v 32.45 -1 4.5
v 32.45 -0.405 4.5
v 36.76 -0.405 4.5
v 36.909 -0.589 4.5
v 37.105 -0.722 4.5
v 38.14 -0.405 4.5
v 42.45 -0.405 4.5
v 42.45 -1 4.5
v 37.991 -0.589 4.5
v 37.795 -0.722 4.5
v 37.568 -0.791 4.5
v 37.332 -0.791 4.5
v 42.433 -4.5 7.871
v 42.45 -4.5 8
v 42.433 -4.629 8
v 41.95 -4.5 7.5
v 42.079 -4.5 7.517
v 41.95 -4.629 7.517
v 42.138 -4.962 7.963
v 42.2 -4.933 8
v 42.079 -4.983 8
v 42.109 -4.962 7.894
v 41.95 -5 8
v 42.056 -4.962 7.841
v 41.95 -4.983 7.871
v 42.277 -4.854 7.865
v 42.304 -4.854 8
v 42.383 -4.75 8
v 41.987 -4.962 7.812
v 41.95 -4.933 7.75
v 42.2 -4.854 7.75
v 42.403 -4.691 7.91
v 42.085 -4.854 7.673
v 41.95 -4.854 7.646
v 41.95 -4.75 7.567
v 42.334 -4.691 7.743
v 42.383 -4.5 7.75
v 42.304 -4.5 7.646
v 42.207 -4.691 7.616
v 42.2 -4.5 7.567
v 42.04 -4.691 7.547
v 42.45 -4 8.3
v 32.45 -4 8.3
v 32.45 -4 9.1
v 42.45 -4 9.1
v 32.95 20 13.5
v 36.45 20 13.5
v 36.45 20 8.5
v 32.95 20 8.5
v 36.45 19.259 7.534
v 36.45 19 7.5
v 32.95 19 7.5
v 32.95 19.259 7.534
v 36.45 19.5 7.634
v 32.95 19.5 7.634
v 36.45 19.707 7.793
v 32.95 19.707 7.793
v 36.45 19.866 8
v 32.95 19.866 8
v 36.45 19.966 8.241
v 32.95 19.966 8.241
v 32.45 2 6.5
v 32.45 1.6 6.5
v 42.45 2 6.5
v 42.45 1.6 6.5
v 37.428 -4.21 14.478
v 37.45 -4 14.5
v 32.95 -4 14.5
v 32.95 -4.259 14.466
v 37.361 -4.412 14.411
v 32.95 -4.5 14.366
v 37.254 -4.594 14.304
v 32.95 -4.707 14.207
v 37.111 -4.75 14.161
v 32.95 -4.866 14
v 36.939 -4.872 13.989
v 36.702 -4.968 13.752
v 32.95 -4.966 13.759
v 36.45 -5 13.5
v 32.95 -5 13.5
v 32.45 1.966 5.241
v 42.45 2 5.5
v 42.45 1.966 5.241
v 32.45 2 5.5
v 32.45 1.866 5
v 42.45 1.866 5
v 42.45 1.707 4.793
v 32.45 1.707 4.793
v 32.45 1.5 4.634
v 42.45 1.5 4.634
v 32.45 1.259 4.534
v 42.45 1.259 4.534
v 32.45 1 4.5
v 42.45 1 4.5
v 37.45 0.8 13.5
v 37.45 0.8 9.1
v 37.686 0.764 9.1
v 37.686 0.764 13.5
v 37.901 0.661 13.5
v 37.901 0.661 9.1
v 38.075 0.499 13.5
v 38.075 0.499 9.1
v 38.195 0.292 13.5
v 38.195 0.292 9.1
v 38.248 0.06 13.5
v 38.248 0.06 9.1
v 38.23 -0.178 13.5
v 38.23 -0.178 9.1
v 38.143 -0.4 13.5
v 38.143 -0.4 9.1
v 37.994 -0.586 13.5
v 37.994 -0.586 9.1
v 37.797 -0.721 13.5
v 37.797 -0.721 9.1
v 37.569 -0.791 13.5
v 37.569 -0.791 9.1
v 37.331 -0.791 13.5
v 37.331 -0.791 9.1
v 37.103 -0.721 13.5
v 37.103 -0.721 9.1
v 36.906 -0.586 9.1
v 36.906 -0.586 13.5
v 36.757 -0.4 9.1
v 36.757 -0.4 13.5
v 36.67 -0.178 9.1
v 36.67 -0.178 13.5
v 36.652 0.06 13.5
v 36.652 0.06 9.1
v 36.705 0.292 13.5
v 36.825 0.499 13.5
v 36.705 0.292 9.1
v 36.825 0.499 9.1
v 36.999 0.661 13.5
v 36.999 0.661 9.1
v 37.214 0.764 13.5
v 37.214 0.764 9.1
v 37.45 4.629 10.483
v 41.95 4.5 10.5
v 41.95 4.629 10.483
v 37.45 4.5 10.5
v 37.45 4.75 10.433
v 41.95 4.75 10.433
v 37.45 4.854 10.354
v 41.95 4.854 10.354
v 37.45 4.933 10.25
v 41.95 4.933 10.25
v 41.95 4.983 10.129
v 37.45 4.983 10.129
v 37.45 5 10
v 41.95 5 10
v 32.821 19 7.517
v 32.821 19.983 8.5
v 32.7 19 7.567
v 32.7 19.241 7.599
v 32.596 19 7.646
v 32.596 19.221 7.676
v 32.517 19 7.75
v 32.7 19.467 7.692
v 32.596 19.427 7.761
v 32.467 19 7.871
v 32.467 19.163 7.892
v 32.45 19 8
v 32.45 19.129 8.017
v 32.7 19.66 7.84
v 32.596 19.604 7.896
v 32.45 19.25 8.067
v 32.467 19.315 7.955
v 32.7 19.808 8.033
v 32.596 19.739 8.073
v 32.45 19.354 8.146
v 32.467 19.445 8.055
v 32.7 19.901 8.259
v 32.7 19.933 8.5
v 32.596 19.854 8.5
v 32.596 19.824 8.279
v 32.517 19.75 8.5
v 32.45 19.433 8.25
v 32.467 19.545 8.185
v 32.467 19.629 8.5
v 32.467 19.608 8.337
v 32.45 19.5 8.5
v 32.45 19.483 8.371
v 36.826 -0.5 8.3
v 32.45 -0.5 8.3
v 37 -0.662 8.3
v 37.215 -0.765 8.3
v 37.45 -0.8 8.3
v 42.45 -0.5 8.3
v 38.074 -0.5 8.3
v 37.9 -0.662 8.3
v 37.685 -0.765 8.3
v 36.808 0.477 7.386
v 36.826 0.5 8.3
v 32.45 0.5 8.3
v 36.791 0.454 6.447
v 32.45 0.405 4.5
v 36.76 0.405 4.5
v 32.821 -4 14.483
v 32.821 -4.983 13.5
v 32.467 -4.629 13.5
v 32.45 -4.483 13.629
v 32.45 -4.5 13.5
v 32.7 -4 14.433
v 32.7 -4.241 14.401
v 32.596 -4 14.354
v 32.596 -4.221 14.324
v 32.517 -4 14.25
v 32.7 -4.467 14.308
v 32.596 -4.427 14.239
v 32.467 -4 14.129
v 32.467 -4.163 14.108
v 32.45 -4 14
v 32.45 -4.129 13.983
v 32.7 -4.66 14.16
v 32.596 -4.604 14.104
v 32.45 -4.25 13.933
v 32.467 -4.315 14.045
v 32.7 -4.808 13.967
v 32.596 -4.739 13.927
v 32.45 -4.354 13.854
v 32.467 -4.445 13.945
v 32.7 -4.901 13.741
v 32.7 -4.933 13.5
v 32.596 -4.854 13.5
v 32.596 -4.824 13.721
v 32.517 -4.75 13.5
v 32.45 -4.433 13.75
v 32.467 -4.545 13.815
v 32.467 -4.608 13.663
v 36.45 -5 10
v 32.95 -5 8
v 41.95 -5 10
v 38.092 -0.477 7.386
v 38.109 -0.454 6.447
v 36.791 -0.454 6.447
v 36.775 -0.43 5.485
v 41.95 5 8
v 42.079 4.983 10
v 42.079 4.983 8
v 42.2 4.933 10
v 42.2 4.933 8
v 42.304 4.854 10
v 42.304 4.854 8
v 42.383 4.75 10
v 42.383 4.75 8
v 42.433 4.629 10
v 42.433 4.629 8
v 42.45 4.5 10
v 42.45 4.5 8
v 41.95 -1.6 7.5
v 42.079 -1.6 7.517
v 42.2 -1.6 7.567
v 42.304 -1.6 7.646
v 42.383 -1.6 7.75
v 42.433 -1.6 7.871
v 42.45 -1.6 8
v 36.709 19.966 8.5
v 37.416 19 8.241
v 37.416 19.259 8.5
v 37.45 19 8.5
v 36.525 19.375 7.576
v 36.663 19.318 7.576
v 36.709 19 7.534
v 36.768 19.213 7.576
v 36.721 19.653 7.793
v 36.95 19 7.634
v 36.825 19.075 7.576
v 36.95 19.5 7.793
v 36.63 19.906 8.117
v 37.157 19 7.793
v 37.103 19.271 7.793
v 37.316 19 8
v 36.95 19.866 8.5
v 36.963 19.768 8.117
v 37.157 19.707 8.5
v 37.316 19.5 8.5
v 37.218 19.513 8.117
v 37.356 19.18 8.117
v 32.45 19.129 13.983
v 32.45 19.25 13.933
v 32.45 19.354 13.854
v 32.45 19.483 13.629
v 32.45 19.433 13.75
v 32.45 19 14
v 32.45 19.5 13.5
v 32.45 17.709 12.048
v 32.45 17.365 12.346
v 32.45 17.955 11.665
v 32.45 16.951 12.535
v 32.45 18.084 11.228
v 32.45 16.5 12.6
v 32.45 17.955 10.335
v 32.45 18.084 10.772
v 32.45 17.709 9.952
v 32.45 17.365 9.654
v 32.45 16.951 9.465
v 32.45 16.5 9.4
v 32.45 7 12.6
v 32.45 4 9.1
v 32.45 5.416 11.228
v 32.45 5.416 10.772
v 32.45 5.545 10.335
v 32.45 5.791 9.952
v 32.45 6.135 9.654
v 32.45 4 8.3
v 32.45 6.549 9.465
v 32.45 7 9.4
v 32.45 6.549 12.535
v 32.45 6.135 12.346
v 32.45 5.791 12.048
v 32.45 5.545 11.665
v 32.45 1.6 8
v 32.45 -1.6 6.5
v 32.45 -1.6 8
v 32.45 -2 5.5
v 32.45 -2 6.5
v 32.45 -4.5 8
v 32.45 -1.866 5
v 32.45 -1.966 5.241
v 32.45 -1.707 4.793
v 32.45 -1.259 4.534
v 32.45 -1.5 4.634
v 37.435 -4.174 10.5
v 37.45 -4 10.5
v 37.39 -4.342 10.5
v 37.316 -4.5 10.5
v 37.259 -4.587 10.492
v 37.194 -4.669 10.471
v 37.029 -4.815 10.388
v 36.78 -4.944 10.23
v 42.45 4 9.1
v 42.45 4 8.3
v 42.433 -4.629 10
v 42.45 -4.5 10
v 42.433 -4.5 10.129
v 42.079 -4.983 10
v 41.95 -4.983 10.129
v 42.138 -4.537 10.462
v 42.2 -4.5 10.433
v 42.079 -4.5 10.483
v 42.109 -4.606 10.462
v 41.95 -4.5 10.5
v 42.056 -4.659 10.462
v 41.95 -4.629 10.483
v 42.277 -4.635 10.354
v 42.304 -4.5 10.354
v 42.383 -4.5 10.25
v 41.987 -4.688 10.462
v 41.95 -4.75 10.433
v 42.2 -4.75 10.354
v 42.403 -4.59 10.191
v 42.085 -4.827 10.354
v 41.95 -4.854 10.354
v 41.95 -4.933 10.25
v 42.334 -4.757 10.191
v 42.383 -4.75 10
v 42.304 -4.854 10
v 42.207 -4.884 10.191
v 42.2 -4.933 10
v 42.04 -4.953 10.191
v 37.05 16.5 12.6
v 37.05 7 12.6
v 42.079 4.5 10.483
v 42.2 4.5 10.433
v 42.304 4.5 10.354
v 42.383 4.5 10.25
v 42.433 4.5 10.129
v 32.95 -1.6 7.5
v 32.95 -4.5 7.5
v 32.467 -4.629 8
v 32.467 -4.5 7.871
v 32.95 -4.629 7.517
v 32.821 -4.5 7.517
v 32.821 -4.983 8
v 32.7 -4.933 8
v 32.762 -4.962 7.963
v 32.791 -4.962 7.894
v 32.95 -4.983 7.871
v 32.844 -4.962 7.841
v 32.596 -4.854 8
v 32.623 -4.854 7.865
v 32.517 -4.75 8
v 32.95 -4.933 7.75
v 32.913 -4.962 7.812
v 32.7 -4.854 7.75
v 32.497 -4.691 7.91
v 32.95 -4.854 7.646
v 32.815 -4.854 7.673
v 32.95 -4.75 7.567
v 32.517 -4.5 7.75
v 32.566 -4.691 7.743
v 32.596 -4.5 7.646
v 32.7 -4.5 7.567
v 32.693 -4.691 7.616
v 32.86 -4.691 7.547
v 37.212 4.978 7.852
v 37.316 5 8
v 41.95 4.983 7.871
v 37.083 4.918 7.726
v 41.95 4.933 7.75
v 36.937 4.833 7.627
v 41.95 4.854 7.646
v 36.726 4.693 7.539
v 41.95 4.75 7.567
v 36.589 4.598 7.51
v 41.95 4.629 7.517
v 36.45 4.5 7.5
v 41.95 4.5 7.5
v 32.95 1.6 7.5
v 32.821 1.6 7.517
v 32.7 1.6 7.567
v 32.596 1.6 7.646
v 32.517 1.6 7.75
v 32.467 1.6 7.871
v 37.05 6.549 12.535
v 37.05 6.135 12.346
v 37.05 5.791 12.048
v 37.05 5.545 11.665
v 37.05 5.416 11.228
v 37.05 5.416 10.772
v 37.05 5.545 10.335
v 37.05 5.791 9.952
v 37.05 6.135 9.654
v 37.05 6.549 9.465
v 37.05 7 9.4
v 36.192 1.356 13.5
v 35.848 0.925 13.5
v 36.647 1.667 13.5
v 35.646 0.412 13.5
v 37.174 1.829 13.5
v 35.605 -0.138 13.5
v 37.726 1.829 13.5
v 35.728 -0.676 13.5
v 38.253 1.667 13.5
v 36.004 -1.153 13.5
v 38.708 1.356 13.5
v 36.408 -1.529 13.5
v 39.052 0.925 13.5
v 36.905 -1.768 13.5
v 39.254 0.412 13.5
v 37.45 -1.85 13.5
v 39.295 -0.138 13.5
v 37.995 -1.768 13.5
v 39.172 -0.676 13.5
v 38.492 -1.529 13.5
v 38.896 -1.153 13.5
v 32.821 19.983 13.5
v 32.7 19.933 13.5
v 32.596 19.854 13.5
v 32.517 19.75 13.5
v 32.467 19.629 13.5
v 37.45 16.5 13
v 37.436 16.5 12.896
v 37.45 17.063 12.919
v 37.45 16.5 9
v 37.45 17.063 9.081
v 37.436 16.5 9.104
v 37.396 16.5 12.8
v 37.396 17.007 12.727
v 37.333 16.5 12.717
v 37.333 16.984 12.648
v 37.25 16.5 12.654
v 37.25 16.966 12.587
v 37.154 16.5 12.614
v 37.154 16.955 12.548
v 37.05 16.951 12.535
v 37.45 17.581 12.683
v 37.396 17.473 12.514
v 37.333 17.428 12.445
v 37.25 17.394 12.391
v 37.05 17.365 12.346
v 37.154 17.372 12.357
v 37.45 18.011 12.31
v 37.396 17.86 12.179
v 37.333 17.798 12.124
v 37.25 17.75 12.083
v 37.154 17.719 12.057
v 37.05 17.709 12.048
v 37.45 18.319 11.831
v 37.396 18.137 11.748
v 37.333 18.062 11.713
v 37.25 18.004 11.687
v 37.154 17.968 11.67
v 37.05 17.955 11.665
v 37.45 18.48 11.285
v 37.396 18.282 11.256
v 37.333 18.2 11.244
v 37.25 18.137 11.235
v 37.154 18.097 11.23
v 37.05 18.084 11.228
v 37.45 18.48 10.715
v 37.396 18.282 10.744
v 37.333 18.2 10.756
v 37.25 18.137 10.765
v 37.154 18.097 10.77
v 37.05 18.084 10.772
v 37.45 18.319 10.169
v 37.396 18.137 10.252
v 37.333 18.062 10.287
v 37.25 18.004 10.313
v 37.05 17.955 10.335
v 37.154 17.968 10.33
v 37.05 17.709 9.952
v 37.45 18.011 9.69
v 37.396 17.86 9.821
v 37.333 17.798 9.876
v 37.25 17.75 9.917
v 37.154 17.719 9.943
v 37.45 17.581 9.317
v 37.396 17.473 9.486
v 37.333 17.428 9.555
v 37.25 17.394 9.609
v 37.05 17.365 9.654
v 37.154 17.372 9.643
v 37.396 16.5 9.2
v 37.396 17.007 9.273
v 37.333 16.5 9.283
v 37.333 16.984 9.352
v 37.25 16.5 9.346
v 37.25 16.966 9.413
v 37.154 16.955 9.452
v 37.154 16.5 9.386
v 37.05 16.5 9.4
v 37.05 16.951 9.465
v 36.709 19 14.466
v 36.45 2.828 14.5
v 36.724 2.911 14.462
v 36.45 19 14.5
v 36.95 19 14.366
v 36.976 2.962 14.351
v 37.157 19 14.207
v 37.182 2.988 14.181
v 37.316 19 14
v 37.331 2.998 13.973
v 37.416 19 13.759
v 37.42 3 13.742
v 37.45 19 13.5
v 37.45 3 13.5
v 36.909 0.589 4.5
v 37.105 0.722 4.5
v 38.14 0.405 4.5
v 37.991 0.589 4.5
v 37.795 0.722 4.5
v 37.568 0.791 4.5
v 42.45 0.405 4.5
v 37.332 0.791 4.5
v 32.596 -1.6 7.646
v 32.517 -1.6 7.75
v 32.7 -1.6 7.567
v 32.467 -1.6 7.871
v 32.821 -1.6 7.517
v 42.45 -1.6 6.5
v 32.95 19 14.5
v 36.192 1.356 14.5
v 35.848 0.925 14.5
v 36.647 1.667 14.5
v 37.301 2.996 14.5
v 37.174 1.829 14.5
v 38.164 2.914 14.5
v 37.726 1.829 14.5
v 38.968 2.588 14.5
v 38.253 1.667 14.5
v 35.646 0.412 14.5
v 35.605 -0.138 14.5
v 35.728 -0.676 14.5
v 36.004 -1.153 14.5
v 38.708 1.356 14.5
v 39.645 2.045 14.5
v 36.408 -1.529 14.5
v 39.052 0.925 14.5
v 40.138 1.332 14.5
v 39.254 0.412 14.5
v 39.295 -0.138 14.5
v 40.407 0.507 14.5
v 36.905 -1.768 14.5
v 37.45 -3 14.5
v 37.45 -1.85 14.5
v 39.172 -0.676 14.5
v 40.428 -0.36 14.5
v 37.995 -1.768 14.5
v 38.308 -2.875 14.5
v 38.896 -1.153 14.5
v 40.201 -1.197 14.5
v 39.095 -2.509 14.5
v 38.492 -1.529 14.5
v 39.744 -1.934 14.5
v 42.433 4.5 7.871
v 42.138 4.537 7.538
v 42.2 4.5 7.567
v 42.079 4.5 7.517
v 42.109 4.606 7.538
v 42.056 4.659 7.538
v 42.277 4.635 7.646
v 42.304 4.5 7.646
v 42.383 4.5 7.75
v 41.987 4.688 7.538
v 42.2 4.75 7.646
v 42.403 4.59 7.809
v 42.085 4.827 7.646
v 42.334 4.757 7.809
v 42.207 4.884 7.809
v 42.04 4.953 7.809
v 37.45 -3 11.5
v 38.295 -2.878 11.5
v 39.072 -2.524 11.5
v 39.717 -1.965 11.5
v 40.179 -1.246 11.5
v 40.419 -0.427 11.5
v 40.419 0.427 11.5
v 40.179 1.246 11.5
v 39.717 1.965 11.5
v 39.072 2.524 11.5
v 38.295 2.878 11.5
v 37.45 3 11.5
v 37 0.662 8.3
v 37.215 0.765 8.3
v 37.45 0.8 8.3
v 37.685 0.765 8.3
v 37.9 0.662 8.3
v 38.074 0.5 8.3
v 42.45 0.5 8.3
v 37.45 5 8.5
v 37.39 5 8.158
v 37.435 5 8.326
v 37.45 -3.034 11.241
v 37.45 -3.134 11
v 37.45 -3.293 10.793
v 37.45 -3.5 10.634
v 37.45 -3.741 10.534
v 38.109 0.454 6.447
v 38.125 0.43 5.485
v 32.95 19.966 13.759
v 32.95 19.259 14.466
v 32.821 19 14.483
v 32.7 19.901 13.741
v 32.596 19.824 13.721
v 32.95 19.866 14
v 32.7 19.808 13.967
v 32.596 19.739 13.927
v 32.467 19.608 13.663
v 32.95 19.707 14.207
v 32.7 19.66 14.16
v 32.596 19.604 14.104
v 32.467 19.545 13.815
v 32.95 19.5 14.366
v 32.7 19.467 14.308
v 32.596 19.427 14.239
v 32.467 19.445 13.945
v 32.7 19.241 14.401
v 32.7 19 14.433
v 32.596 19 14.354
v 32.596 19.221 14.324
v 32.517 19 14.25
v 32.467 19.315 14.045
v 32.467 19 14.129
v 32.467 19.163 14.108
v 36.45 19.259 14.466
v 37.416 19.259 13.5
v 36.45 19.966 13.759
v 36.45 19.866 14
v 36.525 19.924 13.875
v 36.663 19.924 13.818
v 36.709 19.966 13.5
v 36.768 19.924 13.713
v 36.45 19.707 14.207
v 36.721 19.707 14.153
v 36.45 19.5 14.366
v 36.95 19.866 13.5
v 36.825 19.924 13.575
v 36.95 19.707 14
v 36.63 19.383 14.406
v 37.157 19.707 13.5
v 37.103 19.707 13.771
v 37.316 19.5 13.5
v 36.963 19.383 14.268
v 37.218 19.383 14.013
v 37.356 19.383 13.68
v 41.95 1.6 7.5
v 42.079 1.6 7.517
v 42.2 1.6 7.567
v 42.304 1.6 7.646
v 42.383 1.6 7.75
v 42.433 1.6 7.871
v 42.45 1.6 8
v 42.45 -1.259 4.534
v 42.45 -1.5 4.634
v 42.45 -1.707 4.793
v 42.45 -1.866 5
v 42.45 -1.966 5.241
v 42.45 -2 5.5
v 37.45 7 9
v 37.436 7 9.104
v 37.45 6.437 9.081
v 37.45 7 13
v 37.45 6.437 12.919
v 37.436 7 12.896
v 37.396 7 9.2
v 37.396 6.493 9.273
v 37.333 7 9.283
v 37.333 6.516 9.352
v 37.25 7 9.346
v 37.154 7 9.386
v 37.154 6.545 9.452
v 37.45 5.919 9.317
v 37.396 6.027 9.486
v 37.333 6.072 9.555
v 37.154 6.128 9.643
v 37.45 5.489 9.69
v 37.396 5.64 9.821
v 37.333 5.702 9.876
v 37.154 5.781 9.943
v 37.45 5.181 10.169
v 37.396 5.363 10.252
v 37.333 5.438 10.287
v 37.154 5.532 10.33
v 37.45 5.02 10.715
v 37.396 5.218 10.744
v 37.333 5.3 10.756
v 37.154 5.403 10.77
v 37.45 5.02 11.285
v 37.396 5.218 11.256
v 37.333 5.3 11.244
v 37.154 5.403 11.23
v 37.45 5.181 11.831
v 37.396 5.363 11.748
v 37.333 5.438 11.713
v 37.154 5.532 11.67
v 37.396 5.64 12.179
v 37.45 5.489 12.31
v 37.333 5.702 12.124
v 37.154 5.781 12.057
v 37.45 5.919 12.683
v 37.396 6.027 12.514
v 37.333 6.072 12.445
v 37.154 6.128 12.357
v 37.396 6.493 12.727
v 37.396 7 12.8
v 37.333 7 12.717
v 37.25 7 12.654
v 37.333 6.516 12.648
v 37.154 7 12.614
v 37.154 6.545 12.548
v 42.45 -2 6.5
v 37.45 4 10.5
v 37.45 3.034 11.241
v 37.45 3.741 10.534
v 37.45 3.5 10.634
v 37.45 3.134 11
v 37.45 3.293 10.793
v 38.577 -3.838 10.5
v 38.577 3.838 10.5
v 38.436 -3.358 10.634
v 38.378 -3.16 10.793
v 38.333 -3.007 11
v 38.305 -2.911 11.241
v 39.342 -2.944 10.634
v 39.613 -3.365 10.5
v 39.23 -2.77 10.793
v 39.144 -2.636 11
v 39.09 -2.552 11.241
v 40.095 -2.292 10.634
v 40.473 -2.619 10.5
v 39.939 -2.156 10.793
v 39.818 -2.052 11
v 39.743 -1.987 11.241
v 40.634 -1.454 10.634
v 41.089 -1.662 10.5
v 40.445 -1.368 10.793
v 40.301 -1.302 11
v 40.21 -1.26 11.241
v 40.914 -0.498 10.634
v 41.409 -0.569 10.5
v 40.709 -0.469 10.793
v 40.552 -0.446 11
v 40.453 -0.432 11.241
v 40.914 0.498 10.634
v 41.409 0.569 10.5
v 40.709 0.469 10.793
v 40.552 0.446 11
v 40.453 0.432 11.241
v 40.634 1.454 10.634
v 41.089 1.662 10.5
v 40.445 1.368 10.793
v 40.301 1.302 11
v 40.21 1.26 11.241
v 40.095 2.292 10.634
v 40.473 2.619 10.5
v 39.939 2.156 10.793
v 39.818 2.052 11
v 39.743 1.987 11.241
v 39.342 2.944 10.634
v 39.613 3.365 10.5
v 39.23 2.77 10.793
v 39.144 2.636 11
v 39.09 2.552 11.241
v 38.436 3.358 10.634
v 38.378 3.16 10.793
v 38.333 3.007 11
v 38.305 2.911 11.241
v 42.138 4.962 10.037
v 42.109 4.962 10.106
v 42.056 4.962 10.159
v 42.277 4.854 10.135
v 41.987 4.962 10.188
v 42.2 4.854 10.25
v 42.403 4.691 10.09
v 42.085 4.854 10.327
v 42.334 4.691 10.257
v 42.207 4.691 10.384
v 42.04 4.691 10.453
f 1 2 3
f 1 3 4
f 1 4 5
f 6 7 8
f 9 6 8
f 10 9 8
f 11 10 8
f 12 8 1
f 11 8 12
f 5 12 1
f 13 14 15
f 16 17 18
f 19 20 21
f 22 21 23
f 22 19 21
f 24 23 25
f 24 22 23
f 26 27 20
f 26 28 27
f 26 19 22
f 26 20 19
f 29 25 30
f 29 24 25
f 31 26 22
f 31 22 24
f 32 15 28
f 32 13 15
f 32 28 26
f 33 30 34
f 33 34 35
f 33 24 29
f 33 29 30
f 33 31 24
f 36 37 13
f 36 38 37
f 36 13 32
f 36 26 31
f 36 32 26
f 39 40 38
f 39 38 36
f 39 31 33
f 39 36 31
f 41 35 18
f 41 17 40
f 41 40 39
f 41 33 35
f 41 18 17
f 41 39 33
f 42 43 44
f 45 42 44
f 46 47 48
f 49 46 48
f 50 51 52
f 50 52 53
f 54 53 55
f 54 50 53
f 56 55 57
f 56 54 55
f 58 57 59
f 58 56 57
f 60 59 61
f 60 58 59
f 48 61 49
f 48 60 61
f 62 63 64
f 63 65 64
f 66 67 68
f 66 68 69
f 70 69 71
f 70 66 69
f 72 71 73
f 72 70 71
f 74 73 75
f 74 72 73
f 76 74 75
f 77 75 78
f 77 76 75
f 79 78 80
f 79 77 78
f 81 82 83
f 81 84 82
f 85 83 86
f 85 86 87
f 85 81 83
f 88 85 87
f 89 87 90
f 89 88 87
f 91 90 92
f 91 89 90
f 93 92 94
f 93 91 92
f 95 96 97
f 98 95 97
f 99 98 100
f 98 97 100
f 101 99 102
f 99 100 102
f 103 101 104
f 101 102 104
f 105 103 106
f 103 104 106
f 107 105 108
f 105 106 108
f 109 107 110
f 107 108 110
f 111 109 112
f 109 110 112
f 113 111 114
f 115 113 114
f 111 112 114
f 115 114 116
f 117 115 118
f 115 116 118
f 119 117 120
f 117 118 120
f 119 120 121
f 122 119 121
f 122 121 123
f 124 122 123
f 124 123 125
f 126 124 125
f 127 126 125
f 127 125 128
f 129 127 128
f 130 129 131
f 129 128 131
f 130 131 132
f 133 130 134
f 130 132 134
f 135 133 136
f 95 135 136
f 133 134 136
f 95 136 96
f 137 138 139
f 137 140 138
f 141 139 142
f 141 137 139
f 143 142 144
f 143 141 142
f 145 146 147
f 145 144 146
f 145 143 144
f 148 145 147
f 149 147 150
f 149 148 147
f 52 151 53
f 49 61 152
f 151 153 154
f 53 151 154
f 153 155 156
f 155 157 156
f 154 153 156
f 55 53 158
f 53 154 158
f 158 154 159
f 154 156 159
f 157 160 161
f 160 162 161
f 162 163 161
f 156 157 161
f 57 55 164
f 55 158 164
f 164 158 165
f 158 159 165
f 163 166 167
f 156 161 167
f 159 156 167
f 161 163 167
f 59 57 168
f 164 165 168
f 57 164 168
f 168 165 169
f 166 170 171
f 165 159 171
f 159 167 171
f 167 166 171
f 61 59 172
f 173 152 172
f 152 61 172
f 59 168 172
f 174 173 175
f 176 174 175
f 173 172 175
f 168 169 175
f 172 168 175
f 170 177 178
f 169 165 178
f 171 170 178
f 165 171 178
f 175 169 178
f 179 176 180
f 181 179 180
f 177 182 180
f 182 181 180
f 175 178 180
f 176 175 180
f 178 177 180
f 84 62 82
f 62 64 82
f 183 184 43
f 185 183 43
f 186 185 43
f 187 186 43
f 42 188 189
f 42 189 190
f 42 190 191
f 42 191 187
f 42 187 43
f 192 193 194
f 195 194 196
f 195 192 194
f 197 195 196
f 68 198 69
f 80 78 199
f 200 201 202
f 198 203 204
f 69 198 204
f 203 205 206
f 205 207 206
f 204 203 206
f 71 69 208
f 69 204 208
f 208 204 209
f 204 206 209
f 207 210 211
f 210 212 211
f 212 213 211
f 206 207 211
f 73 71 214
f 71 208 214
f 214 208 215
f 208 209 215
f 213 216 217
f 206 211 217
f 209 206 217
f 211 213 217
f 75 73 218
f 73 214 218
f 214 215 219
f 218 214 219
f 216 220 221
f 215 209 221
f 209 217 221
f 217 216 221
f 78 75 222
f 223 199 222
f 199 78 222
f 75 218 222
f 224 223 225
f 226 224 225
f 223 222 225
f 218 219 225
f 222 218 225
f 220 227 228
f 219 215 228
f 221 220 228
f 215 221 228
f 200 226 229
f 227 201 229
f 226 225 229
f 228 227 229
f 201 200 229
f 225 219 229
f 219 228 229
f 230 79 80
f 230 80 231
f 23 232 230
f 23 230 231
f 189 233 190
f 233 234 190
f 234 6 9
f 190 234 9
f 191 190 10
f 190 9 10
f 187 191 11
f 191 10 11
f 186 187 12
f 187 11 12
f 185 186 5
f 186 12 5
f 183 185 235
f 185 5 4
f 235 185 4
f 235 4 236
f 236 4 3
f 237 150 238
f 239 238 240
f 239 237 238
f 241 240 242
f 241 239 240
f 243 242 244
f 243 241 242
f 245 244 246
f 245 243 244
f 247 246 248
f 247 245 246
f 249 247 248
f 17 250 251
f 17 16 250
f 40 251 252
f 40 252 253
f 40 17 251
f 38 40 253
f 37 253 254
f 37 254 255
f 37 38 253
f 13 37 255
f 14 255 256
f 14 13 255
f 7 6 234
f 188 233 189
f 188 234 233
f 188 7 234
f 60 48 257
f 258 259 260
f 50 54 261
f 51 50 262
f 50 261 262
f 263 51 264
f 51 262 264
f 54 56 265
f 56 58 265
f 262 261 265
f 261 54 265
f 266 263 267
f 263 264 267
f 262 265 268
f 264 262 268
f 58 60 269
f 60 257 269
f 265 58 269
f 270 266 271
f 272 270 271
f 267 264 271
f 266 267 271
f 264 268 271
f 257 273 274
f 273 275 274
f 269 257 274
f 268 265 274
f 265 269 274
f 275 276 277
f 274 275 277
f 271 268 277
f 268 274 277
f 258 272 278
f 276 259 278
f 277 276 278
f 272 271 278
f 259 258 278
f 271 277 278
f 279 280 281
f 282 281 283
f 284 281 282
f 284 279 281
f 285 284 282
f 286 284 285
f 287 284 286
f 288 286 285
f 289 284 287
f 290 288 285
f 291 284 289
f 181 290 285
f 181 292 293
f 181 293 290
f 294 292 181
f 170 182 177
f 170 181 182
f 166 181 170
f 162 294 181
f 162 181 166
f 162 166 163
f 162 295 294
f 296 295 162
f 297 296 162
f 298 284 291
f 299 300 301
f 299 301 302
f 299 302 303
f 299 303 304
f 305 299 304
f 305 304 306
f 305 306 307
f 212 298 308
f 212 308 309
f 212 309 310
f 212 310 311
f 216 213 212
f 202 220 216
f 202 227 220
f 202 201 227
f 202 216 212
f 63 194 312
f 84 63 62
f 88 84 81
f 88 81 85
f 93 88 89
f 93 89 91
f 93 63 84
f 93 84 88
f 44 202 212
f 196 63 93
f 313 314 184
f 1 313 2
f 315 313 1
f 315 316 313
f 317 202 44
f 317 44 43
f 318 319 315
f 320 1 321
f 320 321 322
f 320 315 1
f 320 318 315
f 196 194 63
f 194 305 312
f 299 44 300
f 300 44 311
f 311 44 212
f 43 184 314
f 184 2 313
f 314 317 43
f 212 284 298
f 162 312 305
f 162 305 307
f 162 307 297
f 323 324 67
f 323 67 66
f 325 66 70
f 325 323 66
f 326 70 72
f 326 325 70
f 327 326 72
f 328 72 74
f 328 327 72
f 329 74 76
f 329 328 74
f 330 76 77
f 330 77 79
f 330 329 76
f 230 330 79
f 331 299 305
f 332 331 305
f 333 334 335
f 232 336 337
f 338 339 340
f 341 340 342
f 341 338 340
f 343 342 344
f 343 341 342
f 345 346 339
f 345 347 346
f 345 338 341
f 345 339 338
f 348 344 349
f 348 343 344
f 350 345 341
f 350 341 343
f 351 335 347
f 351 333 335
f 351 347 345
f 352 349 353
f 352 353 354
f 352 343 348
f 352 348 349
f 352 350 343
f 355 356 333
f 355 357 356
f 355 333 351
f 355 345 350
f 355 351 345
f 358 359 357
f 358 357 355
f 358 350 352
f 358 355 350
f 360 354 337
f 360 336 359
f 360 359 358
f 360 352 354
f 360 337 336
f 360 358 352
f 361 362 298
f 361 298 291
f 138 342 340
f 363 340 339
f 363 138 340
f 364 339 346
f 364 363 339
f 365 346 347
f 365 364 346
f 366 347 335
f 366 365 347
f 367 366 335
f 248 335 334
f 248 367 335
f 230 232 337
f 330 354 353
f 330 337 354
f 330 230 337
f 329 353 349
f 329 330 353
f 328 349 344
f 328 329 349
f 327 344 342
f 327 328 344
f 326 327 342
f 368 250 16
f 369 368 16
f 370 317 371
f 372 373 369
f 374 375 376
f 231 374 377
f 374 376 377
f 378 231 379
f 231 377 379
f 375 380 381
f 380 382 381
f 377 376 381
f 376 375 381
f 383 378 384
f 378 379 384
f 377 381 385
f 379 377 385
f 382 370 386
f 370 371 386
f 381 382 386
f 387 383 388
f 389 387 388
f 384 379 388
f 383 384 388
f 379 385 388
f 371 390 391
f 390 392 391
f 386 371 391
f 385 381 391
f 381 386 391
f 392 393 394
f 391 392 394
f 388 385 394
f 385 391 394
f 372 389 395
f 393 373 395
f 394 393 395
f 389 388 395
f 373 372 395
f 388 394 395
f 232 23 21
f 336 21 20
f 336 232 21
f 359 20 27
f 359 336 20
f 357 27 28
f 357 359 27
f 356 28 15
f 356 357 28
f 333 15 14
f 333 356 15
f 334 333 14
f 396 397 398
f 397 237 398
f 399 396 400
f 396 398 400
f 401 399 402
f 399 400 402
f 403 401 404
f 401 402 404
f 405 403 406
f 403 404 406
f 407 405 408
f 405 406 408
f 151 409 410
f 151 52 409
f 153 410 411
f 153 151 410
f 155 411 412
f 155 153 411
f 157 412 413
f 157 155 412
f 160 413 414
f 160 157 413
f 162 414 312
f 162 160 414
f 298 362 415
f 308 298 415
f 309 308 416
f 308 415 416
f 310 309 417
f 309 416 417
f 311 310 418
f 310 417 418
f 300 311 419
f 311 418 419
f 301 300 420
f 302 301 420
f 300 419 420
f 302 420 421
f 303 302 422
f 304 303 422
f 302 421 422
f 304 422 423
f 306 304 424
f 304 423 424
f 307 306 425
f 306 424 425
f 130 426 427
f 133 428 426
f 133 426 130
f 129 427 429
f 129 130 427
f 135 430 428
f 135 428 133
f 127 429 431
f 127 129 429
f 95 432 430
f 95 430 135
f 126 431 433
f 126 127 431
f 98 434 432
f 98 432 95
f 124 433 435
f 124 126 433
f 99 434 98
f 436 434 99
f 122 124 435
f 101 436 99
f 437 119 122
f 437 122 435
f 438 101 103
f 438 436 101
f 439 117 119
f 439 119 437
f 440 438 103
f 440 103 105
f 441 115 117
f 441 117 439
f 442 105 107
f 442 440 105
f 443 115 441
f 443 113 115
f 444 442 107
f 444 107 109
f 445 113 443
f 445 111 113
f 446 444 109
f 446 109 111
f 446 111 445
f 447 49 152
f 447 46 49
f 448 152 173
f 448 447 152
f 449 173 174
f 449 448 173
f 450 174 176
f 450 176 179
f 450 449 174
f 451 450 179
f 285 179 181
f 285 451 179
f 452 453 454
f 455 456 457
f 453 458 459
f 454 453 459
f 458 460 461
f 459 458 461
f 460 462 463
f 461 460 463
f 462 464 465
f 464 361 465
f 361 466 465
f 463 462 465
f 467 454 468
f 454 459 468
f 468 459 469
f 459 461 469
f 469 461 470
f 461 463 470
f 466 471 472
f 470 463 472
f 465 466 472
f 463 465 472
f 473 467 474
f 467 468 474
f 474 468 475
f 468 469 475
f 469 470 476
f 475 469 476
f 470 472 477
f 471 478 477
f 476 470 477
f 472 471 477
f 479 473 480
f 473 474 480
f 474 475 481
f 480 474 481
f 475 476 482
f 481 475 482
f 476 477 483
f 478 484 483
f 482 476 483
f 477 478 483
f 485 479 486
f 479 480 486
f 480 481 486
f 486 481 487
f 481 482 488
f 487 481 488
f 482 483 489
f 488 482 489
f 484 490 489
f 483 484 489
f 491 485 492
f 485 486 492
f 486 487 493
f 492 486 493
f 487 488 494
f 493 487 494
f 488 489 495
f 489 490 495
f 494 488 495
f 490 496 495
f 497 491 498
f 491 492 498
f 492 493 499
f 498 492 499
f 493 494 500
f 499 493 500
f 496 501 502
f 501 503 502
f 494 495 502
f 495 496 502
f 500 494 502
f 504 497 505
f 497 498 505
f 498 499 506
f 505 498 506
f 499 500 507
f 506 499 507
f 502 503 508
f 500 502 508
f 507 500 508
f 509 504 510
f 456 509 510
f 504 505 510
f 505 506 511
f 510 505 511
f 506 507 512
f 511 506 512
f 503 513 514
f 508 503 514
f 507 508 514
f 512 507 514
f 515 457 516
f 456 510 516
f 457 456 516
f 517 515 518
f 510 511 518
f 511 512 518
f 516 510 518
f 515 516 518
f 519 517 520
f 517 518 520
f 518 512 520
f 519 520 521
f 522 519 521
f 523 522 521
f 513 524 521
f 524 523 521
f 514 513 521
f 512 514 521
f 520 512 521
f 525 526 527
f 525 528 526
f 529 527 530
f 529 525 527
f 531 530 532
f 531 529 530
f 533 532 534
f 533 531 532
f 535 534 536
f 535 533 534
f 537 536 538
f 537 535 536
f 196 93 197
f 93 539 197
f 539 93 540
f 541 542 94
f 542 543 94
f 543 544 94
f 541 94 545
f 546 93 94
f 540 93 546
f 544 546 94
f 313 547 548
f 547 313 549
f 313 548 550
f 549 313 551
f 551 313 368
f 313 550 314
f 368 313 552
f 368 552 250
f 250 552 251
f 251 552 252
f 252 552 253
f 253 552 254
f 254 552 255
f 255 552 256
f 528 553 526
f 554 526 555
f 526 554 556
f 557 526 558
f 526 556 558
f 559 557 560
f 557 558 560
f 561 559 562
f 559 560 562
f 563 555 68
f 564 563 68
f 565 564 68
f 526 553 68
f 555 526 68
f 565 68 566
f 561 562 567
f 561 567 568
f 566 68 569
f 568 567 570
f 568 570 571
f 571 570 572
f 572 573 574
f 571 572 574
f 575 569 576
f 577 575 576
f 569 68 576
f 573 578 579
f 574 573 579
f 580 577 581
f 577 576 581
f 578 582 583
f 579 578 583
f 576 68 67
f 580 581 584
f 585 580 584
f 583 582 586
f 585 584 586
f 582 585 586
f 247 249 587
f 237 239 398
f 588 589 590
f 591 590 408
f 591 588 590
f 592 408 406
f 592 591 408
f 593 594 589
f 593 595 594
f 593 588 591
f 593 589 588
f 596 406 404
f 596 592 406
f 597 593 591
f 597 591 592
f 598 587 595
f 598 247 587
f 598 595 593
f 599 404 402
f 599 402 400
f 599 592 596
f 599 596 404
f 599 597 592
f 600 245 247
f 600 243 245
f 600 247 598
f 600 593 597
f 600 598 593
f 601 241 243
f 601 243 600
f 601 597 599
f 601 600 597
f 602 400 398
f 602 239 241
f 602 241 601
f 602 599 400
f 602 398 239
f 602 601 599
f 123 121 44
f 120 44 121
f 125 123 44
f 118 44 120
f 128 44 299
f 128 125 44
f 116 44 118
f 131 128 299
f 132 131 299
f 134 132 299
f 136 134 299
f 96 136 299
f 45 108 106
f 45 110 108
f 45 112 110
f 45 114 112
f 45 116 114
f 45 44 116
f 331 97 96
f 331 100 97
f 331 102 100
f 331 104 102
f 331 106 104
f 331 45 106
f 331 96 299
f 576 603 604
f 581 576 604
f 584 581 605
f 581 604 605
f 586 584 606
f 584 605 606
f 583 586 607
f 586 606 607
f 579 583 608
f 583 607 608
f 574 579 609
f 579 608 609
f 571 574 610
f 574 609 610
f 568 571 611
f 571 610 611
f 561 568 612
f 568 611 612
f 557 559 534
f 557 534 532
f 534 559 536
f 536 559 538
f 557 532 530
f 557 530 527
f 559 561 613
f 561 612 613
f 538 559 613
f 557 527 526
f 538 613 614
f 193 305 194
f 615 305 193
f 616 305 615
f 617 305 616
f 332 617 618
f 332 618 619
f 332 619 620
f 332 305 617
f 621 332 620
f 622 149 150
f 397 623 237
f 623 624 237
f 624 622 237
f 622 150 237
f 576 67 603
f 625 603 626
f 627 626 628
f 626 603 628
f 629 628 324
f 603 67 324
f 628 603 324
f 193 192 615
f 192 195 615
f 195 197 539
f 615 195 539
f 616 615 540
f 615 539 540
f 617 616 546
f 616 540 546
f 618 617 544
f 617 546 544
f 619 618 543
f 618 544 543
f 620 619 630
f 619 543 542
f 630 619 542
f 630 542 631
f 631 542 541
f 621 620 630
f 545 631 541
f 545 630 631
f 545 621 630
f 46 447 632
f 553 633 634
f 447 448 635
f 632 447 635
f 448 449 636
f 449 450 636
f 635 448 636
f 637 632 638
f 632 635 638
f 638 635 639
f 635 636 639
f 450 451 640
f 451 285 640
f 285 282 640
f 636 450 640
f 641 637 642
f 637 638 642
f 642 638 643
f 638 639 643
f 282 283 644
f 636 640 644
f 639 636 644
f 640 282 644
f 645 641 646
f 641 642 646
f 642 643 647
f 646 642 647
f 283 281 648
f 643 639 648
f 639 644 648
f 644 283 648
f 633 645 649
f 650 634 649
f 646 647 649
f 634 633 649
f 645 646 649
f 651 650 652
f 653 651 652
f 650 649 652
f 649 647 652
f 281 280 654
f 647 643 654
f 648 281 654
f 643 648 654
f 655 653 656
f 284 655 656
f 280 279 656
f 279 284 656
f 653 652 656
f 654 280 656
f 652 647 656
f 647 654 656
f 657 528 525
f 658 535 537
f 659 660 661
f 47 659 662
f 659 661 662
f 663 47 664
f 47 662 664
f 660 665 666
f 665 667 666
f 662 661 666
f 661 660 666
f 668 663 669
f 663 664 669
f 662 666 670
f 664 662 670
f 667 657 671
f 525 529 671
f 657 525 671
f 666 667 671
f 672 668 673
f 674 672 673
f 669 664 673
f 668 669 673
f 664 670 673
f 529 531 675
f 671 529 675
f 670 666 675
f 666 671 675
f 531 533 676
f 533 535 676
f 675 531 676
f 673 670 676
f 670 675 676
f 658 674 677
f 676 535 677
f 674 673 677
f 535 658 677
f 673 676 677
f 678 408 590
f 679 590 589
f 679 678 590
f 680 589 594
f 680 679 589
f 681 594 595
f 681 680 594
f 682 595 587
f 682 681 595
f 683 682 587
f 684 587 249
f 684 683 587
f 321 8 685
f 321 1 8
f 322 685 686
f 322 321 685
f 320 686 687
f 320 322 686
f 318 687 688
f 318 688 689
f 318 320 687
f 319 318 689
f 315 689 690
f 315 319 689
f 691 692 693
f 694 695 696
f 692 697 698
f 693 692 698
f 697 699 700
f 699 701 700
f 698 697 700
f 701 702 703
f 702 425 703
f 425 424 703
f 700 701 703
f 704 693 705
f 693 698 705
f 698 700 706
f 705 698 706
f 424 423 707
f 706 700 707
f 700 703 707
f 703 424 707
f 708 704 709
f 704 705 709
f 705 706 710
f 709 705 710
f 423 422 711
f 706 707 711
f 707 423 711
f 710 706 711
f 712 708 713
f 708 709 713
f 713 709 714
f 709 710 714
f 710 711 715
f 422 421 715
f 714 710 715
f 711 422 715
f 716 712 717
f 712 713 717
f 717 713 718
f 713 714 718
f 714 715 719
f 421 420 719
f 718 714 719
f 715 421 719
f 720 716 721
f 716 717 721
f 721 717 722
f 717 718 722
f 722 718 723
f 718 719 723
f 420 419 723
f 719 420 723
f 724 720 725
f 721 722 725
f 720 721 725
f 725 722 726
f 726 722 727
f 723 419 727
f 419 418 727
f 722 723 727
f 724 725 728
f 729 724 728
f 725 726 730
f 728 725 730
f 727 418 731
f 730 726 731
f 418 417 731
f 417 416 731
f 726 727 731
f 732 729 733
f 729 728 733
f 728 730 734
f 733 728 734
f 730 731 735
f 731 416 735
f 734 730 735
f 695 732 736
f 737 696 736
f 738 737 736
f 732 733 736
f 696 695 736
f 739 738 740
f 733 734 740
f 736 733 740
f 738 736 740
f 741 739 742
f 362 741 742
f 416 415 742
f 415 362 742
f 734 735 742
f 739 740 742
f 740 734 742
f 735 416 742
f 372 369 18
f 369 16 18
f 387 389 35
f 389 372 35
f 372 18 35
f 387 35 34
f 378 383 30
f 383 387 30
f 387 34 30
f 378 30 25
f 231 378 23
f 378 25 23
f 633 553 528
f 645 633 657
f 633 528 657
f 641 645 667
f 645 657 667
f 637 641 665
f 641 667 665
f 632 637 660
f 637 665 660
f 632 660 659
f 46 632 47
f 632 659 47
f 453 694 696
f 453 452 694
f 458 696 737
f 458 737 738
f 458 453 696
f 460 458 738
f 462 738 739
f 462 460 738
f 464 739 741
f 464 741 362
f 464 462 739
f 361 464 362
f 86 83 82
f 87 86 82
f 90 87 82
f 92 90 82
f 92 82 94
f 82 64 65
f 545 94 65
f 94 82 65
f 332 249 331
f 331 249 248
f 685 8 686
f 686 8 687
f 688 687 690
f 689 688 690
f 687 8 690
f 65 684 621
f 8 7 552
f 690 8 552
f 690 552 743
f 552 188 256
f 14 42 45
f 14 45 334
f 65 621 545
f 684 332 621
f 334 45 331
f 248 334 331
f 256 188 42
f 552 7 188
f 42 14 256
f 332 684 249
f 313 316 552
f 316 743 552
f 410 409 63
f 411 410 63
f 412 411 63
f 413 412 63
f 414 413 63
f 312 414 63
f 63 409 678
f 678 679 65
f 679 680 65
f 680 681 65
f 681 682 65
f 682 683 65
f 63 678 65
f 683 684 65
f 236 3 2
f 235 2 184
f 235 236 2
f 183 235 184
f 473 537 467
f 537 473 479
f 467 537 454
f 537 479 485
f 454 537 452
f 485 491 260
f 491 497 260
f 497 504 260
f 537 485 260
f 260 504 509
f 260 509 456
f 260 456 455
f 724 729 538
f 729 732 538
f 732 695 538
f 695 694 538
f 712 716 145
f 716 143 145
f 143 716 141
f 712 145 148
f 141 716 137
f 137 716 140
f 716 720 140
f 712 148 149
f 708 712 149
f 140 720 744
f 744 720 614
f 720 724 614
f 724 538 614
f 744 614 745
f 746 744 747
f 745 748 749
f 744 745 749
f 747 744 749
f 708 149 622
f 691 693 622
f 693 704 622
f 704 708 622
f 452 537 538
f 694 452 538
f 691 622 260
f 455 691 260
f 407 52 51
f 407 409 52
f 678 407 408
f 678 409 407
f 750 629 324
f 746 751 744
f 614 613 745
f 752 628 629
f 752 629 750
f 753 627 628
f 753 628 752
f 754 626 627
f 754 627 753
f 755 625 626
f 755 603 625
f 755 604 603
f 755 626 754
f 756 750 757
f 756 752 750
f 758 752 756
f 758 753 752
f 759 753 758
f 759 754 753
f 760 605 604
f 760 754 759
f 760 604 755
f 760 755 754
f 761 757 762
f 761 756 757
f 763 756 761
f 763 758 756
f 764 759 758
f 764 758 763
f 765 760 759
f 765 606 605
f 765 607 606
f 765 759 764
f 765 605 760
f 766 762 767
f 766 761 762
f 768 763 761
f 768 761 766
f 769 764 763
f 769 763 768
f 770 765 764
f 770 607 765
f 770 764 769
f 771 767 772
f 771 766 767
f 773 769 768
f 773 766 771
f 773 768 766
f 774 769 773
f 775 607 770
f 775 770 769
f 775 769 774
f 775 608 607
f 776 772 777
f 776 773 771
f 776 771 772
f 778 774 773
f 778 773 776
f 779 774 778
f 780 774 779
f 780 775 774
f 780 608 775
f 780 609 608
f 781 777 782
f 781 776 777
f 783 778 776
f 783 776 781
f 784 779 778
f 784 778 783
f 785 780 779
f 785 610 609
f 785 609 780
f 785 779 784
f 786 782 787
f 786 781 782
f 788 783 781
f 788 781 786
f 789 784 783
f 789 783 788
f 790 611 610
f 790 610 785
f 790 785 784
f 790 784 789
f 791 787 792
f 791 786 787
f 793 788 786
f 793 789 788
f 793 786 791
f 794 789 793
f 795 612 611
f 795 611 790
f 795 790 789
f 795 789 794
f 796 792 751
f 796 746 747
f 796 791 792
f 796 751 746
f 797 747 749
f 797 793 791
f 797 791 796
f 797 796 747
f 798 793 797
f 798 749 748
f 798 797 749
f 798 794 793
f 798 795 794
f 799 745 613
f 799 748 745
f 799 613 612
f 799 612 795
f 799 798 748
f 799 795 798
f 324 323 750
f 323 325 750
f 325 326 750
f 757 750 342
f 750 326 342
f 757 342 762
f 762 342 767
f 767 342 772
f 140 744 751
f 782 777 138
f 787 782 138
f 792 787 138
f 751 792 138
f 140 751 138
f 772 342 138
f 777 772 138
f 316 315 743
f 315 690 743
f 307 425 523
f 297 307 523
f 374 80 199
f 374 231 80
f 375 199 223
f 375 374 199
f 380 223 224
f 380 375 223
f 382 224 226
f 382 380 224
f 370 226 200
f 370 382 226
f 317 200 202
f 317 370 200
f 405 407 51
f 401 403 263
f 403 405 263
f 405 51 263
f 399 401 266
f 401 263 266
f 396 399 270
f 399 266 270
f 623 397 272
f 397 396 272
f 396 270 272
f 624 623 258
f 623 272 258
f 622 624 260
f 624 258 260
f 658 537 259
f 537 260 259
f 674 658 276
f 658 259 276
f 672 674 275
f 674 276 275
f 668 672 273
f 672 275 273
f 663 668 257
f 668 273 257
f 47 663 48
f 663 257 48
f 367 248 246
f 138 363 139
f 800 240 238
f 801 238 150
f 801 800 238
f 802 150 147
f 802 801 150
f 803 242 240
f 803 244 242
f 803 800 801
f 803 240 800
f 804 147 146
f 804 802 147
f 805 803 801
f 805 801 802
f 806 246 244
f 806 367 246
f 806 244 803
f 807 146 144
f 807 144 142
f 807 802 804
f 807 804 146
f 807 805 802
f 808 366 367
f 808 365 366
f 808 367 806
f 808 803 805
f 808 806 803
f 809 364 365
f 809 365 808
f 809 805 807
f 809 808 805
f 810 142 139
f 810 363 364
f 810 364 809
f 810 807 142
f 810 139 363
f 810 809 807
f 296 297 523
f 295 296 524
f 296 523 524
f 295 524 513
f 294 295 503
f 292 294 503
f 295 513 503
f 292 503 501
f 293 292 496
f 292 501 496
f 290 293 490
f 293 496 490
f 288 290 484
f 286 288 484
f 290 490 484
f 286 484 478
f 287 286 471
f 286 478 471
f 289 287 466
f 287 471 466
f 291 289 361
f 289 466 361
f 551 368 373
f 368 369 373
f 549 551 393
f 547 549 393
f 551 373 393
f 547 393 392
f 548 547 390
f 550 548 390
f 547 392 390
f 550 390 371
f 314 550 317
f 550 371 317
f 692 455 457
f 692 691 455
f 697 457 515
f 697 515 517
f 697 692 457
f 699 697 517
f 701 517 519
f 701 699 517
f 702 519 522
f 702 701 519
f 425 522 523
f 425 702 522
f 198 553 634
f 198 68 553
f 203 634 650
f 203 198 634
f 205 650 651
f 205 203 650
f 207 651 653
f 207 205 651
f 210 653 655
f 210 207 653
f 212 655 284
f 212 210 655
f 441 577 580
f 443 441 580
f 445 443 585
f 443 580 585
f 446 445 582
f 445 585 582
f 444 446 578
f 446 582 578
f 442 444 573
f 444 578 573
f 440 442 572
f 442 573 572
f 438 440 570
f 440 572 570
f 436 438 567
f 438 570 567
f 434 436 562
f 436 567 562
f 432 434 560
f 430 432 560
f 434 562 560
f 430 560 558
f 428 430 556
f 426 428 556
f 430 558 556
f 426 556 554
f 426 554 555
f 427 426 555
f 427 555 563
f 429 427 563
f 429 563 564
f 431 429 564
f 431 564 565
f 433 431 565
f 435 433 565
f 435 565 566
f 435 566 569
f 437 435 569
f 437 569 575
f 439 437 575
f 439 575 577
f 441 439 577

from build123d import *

# Parameters (mm, degrees)
PAD020_DEPTH        = 5
SKETCH037_R         = 3
PAD021_DEPTH        = 4
FILLET013_R         = 1
SKETCH038_W         = 7
SKETCH038_H         = 5
PAD022_DEPTH        = 25
HOLE006_D           = 1.6
HOLE006_CBORE_D     = 3.7
HOLE006_CBORE_DEPTH = 1
POCKET016_DEPTH     = 5.001
POCKET017_DEPTH     = 10.001
FILLET014_R         = 1
FILLET015_R         = 0.5
FILLET017_R         = 0.4
FILLET016_R         = 1


with BuildPart() as part:
    # Sketch035 → Pad020 (new body, symmetric)
    with BuildSketch(Plane.YZ):
        Polygon((-5, 7.5), (-5, 10.5), (5, 10.5), (5, 7.5), (1.6, 7.5), (1.6, 6.5), (2, 6.5), (2, 4.5), (-2, 4.5), (-2, 6.5), (-1.6, 6.5), (-1.6, 7.5), align=None)
    extrude(amount=PAD020_DEPTH, both=True)

    # Sketch037 → Pad021 (join)
    with BuildSketch(Plane(origin=(0, 0, 10.5), x_dir=(0, -1, 0), z_dir=(0, 0, 1))):
        Circle(SKETCH037_R)
    extrude(amount=PAD021_DEPTH)

    # Fillet013
    fillet013_edges = [part.edges().sort_by_distance(p)[0] for p in [
        (0, 3, 10.5),
    ]]
    fillet(fillet013_edges, radius=FILLET013_R)

    # Sketch038 (on DatumPlane) → Pad022 (join)
    with BuildSketch(Plane(origin=(0, -5, 0), x_dir=(0, 0, -1), z_dir=(0, -1, 0))):
        with Locations((-11, -2.5)):
            Rectangle(SKETCH038_W, SKETCH038_H)
    extrude(amount=-PAD022_DEPTH)

    # Hole006 (through all)
    with Locations(Plane(origin=(0, 0, 14.5), x_dir=(0, -1, 0), z_dir=(0, 0, 1))):
        with Locations((0, 0)):
            CounterBoreHole(HOLE006_D / 2, HOLE006_CBORE_D / 2, HOLE006_CBORE_DEPTH)

    # Sketch040 (on DatumPlane) → Pocket016 (cut, through all)
    with BuildSketch(Plane.YZ):
        with BuildLine():
            ThreePointArc((16.5, 9.4), (18.1, 11), (16.5, 12.6))
            Line((7, 12.6), (16.5, 12.6))
            ThreePointArc((7, 12.6), (5.4, 11), (7, 9.4))
            Line((7, 9.4), (16.5, 9.4))
        make_face()
    extrude(amount=-POCKET016_DEPTH, mode=Mode.SUBTRACT)

    # Sketch036 → Pocket017 (cut, through all)
    with BuildSketch(Plane.YZ.offset(5)):
        Polygon((0.5, 8.3), (0.4, 4.3), (-0.4, 4.3), (-0.5, 8.3), (-4, 8.3), (-4, 9.1), (4, 9.1), (4, 8.3), align=None)
    extrude(amount=-POCKET017_DEPTH, mode=Mode.SUBTRACT)

    # Fillet014
    fillet014_edges = [part.edges().sort_by_distance(p)[0] for p in [
        (-2.5, -5, 14.5),
        (0, -5, 12.5),
        (0, 11.5, 14.5),
        (-2.5, 20, 14.5),
        (0, 20, 11),
        (-2.5, 20, 7.5),
        (0, 12.5, 7.5),
    ]]
    fillet(fillet014_edges, radius=FILLET014_R)

    # Fillet015
    fillet015_edges = [part.edges().sort_by_distance(p)[0] for p in [
        (-5, -3.3, 7.5),
        (-5, -5, 10.5),
        (-5, 10.3, 7.5),
        (-5, 7.5, 14.5),
        (-5, -4.707107, 14.207107),
        (-5, 19.707107, 7.792893),
        (-5, 20, 11),
        (-5, 19.707107, 14.207107),
        (5, -3.3, 7.5),
        (5, -5, 9),
        (5, 0, 10.5),
        (5, 5, 9),
        (5, 3.3, 7.5),
        (2.5, 5, 7.5),
        (-0.5, 5, 7.5),
        (2.5, -5, 10.5),
        (-0.5, -5, 10.5),
        (0, -5, 7.5),
        (2.5, 5, 10.5),
    ]]
    fillet(fillet015_edges, radius=FILLET015_R)

    # Fillet017
    fillet017_edges = [part.edges().sort_by_distance(p)[0] for p in [
        (0, 11.75, 12.6),
        (0, 5.4, 11),
        (0, 11.75, 9.4),
        (0, 18.1, 11),
    ]]
    fillet(fillet017_edges, radius=FILLET017_R)

    # Fillet016
    fillet016_edges = [part.edges().sort_by_distance(p)[0] for p in [
        (0, 2, 4.5),
        (0, -2, 4.5),
    ]]
    fillet(fillet016_edges, radius=FILLET016_R)


with BuildPart() as part_1:
    # Body005 placement: moved
    add(part.part.moved(Location((37.45, 0, 0))))


solid = part_1.part
